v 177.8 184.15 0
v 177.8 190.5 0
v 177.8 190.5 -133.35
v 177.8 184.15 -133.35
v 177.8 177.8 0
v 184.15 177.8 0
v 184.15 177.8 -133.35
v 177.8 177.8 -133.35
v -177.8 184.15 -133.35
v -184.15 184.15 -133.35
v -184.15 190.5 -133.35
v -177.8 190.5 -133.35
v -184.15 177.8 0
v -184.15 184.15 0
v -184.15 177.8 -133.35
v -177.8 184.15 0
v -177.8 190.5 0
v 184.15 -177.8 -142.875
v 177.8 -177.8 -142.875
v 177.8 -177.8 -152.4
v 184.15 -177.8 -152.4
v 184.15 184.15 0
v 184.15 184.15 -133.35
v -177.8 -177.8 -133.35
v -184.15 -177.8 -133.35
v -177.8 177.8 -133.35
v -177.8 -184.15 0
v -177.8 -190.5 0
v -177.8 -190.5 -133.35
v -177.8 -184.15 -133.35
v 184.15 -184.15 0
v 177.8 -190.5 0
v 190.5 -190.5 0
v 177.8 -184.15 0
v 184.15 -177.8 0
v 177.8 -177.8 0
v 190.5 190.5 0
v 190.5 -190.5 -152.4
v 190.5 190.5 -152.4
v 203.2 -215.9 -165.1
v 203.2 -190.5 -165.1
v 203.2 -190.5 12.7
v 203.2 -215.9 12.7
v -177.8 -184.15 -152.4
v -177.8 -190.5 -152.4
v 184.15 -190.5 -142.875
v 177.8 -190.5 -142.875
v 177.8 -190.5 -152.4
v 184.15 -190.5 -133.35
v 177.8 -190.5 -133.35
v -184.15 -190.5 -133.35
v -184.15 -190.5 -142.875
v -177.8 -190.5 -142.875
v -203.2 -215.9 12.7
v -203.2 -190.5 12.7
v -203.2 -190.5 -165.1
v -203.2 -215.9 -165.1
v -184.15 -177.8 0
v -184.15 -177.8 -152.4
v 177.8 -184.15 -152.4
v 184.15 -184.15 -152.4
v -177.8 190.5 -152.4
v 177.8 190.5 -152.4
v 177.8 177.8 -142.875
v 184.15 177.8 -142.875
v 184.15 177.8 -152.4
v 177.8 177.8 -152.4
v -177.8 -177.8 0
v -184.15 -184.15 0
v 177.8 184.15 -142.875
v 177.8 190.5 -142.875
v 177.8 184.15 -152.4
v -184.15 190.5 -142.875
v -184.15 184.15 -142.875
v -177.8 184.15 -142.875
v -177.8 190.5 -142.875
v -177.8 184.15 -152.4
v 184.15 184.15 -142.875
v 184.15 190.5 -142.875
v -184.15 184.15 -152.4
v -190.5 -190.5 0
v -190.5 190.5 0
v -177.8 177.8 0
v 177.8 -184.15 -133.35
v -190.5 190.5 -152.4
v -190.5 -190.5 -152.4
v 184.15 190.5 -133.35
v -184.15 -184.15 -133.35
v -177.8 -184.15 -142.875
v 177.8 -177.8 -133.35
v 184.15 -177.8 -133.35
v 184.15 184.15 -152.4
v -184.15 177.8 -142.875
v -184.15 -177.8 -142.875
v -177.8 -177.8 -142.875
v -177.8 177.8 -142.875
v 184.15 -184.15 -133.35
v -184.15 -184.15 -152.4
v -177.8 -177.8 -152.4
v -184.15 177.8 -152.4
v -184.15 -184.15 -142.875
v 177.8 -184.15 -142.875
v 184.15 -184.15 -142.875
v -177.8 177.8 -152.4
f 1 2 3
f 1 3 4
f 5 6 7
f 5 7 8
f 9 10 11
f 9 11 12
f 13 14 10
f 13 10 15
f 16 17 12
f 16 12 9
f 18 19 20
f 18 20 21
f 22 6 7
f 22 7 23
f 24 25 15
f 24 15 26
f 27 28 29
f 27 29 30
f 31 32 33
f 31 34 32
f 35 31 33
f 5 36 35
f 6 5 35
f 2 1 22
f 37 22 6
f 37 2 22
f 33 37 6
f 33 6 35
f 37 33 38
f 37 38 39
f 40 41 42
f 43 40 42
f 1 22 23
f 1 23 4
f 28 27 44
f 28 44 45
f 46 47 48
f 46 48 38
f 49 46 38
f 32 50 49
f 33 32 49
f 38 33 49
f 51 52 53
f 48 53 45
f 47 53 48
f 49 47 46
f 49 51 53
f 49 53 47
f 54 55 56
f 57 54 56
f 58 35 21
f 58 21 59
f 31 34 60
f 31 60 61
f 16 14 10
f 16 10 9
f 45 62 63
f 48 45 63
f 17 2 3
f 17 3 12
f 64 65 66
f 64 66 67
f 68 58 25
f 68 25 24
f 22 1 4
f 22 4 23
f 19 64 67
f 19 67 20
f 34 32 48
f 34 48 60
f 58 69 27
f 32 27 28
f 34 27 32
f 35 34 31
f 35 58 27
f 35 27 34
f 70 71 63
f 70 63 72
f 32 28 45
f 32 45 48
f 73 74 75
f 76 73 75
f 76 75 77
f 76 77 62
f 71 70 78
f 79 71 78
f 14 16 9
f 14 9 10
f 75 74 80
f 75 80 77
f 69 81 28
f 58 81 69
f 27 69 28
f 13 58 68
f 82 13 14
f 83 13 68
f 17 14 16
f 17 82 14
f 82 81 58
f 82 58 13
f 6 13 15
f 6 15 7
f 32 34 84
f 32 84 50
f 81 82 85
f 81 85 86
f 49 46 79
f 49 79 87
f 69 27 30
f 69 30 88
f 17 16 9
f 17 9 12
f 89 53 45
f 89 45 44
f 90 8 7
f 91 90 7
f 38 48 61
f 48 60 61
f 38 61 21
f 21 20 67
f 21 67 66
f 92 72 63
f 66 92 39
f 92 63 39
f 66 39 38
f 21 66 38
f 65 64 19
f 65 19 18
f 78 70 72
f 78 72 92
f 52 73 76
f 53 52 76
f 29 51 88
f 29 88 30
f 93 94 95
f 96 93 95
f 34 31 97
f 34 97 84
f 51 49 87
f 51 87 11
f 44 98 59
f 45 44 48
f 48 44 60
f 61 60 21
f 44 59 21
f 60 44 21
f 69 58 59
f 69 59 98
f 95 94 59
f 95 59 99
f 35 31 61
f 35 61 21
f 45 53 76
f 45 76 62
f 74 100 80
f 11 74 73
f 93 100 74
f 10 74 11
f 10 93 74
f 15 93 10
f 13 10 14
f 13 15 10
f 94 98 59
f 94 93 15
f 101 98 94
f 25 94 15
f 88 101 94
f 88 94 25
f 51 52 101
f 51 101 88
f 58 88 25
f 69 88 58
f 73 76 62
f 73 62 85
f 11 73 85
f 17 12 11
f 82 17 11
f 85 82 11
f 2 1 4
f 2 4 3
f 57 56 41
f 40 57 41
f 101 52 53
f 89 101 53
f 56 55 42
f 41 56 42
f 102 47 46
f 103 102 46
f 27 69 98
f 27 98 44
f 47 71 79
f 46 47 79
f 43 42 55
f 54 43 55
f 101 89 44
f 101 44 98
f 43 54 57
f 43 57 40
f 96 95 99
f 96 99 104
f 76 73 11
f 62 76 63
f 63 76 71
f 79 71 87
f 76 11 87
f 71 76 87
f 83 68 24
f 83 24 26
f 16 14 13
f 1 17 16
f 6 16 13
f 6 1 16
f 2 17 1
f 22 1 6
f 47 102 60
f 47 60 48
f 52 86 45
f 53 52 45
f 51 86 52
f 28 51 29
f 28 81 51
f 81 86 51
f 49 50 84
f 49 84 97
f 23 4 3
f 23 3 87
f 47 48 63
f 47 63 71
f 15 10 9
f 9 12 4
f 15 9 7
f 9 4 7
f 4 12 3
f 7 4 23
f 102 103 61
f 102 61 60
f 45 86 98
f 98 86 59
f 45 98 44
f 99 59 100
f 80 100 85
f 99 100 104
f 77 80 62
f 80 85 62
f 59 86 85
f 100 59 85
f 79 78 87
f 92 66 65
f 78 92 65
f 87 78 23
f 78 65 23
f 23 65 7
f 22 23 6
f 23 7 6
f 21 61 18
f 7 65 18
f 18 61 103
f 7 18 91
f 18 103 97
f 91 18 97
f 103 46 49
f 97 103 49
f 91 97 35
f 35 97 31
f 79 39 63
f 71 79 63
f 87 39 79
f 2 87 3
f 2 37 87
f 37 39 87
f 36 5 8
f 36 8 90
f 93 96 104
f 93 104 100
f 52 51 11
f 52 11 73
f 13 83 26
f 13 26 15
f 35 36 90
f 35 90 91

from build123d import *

# Parameters (mm, degrees)
F1_DEPTH  = 152.4
F2_DEPTH  = 152.4
F3_DEPTH  = 133.35
F4_W      = 6.35
F4_H      = 9.525
F5_DEPTH  = 381.001
F6_DEPTH  = 381.001
F8_DEPTH  = 381
F9_W      = 355.6
F9_H      = 152.4
F10_DEPTH = 25.4


with BuildPart() as f1:
    # F0 (on Top) → F1 (new body)
    with BuildSketch(Plane.XY):
        Polygon((-177.8, -190.5), (177.8, -190.5), (177.8, -184.15), (184.15, -184.15), (184.15, -177.8), (177.8, -177.8), (-177.8, -177.8), (-184.15, -177.8), (-184.15, -184.15), (-177.8, -184.15), align=None)
    extrude(amount=-F1_DEPTH)


with BuildPart() as f2:
    # F0 (on Top) → F2 (new body)
    with BuildSketch(Plane.XY):
        Polygon((-190.5, -190.5), (-177.8, -190.5), (-177.8, -184.15), (-184.15, -184.15), (-184.15, -177.8), (-177.8, -177.8), (-177.8, 177.8), (-184.15, 177.8), (-184.15, 184.15), (-177.8, 184.15), (-177.8, 190.5), (-190.5, 190.5), align=None)
    extrude(amount=-F2_DEPTH)

    # F4 (on face) → F5 (cut, through all)
    with BuildSketch(Plane.XZ.offset(190.5)):
        with Locations((-180.975, -138.1125)):
            Rectangle(F4_W, F4_H)
    extrude(amount=-F5_DEPTH, mode=Mode.SUBTRACT)


with BuildPart() as f2b:
    # F0 (on Top) → F2, piece 2 (new body)
    with BuildSketch(Plane.XY):
        Polygon((177.8, -190.5), (190.5, -190.5), (190.5, 190.5), (177.8, 190.5), (177.8, 184.15), (184.15, 184.15), (184.15, 177.8), (177.8, 177.8), (177.8, -177.8), (184.15, -177.8), (184.15, -184.15), (177.8, -184.15), align=None)
    extrude(amount=-F2_DEPTH)

    # F4 (on face) → F6 (cut, through all)
    with BuildSketch(Plane.XZ.offset(190.5)):
        with Locations((180.975, -138.1125)):
            Rectangle(F4_W, F4_H)
    extrude(amount=-F6_DEPTH, mode=Mode.SUBTRACT)


with BuildPart() as f3:
    # F0 (on Top) → F3 (new body)
    with BuildSketch(Plane.XY):
        Polygon((177.8, 184.15), (177.8, 190.5), (-177.8, 190.5), (-177.8, 184.15), (-184.15, 184.15), (-184.15, 177.8), (-177.8, 177.8), (177.8, 177.8), (184.15, 177.8), (184.15, 184.15), align=None)
    extrude(amount=-F3_DEPTH)


with BuildPart() as f8:
    # F7 (on face) → F8 (new body, through all)
    with BuildSketch(Plane.XZ.offset(190.5)):
        Polygon((184.15, -142.875), (184.15, -133.35), (-177.8, -133.35), (-184.15, -133.35), (-184.15, -142.875), (-177.8, -142.875), (-177.8, -152.4), (177.8, -152.4), (177.8, -142.875), align=None)
    extrude(amount=-F8_DEPTH)


with BuildPart() as f10:
    # F9 (on face) → F10 (new body)
    with BuildSketch(Plane.XZ.offset(190.5)):
        Polygon((203.2, -165.1), (203.2, 12.7), (177.8, 12.7), (-177.8, 12.7), (-203.2, 12.7), (-203.2, -165.1), (-177.8, -165.1), (177.8, -165.1), align=None)
        with Locations((0, -76.2)):
            Rectangle(F9_W, F9_H, mode=Mode.SUBTRACT)
        with Locations((0, -76.2)):
            Rectangle(F9_W, F9_H)
    extrude(amount=F10_DEPTH)


solid = Compound([f1.part, f2.part, f2b.part, f3.part, f8.part, f10.part])
